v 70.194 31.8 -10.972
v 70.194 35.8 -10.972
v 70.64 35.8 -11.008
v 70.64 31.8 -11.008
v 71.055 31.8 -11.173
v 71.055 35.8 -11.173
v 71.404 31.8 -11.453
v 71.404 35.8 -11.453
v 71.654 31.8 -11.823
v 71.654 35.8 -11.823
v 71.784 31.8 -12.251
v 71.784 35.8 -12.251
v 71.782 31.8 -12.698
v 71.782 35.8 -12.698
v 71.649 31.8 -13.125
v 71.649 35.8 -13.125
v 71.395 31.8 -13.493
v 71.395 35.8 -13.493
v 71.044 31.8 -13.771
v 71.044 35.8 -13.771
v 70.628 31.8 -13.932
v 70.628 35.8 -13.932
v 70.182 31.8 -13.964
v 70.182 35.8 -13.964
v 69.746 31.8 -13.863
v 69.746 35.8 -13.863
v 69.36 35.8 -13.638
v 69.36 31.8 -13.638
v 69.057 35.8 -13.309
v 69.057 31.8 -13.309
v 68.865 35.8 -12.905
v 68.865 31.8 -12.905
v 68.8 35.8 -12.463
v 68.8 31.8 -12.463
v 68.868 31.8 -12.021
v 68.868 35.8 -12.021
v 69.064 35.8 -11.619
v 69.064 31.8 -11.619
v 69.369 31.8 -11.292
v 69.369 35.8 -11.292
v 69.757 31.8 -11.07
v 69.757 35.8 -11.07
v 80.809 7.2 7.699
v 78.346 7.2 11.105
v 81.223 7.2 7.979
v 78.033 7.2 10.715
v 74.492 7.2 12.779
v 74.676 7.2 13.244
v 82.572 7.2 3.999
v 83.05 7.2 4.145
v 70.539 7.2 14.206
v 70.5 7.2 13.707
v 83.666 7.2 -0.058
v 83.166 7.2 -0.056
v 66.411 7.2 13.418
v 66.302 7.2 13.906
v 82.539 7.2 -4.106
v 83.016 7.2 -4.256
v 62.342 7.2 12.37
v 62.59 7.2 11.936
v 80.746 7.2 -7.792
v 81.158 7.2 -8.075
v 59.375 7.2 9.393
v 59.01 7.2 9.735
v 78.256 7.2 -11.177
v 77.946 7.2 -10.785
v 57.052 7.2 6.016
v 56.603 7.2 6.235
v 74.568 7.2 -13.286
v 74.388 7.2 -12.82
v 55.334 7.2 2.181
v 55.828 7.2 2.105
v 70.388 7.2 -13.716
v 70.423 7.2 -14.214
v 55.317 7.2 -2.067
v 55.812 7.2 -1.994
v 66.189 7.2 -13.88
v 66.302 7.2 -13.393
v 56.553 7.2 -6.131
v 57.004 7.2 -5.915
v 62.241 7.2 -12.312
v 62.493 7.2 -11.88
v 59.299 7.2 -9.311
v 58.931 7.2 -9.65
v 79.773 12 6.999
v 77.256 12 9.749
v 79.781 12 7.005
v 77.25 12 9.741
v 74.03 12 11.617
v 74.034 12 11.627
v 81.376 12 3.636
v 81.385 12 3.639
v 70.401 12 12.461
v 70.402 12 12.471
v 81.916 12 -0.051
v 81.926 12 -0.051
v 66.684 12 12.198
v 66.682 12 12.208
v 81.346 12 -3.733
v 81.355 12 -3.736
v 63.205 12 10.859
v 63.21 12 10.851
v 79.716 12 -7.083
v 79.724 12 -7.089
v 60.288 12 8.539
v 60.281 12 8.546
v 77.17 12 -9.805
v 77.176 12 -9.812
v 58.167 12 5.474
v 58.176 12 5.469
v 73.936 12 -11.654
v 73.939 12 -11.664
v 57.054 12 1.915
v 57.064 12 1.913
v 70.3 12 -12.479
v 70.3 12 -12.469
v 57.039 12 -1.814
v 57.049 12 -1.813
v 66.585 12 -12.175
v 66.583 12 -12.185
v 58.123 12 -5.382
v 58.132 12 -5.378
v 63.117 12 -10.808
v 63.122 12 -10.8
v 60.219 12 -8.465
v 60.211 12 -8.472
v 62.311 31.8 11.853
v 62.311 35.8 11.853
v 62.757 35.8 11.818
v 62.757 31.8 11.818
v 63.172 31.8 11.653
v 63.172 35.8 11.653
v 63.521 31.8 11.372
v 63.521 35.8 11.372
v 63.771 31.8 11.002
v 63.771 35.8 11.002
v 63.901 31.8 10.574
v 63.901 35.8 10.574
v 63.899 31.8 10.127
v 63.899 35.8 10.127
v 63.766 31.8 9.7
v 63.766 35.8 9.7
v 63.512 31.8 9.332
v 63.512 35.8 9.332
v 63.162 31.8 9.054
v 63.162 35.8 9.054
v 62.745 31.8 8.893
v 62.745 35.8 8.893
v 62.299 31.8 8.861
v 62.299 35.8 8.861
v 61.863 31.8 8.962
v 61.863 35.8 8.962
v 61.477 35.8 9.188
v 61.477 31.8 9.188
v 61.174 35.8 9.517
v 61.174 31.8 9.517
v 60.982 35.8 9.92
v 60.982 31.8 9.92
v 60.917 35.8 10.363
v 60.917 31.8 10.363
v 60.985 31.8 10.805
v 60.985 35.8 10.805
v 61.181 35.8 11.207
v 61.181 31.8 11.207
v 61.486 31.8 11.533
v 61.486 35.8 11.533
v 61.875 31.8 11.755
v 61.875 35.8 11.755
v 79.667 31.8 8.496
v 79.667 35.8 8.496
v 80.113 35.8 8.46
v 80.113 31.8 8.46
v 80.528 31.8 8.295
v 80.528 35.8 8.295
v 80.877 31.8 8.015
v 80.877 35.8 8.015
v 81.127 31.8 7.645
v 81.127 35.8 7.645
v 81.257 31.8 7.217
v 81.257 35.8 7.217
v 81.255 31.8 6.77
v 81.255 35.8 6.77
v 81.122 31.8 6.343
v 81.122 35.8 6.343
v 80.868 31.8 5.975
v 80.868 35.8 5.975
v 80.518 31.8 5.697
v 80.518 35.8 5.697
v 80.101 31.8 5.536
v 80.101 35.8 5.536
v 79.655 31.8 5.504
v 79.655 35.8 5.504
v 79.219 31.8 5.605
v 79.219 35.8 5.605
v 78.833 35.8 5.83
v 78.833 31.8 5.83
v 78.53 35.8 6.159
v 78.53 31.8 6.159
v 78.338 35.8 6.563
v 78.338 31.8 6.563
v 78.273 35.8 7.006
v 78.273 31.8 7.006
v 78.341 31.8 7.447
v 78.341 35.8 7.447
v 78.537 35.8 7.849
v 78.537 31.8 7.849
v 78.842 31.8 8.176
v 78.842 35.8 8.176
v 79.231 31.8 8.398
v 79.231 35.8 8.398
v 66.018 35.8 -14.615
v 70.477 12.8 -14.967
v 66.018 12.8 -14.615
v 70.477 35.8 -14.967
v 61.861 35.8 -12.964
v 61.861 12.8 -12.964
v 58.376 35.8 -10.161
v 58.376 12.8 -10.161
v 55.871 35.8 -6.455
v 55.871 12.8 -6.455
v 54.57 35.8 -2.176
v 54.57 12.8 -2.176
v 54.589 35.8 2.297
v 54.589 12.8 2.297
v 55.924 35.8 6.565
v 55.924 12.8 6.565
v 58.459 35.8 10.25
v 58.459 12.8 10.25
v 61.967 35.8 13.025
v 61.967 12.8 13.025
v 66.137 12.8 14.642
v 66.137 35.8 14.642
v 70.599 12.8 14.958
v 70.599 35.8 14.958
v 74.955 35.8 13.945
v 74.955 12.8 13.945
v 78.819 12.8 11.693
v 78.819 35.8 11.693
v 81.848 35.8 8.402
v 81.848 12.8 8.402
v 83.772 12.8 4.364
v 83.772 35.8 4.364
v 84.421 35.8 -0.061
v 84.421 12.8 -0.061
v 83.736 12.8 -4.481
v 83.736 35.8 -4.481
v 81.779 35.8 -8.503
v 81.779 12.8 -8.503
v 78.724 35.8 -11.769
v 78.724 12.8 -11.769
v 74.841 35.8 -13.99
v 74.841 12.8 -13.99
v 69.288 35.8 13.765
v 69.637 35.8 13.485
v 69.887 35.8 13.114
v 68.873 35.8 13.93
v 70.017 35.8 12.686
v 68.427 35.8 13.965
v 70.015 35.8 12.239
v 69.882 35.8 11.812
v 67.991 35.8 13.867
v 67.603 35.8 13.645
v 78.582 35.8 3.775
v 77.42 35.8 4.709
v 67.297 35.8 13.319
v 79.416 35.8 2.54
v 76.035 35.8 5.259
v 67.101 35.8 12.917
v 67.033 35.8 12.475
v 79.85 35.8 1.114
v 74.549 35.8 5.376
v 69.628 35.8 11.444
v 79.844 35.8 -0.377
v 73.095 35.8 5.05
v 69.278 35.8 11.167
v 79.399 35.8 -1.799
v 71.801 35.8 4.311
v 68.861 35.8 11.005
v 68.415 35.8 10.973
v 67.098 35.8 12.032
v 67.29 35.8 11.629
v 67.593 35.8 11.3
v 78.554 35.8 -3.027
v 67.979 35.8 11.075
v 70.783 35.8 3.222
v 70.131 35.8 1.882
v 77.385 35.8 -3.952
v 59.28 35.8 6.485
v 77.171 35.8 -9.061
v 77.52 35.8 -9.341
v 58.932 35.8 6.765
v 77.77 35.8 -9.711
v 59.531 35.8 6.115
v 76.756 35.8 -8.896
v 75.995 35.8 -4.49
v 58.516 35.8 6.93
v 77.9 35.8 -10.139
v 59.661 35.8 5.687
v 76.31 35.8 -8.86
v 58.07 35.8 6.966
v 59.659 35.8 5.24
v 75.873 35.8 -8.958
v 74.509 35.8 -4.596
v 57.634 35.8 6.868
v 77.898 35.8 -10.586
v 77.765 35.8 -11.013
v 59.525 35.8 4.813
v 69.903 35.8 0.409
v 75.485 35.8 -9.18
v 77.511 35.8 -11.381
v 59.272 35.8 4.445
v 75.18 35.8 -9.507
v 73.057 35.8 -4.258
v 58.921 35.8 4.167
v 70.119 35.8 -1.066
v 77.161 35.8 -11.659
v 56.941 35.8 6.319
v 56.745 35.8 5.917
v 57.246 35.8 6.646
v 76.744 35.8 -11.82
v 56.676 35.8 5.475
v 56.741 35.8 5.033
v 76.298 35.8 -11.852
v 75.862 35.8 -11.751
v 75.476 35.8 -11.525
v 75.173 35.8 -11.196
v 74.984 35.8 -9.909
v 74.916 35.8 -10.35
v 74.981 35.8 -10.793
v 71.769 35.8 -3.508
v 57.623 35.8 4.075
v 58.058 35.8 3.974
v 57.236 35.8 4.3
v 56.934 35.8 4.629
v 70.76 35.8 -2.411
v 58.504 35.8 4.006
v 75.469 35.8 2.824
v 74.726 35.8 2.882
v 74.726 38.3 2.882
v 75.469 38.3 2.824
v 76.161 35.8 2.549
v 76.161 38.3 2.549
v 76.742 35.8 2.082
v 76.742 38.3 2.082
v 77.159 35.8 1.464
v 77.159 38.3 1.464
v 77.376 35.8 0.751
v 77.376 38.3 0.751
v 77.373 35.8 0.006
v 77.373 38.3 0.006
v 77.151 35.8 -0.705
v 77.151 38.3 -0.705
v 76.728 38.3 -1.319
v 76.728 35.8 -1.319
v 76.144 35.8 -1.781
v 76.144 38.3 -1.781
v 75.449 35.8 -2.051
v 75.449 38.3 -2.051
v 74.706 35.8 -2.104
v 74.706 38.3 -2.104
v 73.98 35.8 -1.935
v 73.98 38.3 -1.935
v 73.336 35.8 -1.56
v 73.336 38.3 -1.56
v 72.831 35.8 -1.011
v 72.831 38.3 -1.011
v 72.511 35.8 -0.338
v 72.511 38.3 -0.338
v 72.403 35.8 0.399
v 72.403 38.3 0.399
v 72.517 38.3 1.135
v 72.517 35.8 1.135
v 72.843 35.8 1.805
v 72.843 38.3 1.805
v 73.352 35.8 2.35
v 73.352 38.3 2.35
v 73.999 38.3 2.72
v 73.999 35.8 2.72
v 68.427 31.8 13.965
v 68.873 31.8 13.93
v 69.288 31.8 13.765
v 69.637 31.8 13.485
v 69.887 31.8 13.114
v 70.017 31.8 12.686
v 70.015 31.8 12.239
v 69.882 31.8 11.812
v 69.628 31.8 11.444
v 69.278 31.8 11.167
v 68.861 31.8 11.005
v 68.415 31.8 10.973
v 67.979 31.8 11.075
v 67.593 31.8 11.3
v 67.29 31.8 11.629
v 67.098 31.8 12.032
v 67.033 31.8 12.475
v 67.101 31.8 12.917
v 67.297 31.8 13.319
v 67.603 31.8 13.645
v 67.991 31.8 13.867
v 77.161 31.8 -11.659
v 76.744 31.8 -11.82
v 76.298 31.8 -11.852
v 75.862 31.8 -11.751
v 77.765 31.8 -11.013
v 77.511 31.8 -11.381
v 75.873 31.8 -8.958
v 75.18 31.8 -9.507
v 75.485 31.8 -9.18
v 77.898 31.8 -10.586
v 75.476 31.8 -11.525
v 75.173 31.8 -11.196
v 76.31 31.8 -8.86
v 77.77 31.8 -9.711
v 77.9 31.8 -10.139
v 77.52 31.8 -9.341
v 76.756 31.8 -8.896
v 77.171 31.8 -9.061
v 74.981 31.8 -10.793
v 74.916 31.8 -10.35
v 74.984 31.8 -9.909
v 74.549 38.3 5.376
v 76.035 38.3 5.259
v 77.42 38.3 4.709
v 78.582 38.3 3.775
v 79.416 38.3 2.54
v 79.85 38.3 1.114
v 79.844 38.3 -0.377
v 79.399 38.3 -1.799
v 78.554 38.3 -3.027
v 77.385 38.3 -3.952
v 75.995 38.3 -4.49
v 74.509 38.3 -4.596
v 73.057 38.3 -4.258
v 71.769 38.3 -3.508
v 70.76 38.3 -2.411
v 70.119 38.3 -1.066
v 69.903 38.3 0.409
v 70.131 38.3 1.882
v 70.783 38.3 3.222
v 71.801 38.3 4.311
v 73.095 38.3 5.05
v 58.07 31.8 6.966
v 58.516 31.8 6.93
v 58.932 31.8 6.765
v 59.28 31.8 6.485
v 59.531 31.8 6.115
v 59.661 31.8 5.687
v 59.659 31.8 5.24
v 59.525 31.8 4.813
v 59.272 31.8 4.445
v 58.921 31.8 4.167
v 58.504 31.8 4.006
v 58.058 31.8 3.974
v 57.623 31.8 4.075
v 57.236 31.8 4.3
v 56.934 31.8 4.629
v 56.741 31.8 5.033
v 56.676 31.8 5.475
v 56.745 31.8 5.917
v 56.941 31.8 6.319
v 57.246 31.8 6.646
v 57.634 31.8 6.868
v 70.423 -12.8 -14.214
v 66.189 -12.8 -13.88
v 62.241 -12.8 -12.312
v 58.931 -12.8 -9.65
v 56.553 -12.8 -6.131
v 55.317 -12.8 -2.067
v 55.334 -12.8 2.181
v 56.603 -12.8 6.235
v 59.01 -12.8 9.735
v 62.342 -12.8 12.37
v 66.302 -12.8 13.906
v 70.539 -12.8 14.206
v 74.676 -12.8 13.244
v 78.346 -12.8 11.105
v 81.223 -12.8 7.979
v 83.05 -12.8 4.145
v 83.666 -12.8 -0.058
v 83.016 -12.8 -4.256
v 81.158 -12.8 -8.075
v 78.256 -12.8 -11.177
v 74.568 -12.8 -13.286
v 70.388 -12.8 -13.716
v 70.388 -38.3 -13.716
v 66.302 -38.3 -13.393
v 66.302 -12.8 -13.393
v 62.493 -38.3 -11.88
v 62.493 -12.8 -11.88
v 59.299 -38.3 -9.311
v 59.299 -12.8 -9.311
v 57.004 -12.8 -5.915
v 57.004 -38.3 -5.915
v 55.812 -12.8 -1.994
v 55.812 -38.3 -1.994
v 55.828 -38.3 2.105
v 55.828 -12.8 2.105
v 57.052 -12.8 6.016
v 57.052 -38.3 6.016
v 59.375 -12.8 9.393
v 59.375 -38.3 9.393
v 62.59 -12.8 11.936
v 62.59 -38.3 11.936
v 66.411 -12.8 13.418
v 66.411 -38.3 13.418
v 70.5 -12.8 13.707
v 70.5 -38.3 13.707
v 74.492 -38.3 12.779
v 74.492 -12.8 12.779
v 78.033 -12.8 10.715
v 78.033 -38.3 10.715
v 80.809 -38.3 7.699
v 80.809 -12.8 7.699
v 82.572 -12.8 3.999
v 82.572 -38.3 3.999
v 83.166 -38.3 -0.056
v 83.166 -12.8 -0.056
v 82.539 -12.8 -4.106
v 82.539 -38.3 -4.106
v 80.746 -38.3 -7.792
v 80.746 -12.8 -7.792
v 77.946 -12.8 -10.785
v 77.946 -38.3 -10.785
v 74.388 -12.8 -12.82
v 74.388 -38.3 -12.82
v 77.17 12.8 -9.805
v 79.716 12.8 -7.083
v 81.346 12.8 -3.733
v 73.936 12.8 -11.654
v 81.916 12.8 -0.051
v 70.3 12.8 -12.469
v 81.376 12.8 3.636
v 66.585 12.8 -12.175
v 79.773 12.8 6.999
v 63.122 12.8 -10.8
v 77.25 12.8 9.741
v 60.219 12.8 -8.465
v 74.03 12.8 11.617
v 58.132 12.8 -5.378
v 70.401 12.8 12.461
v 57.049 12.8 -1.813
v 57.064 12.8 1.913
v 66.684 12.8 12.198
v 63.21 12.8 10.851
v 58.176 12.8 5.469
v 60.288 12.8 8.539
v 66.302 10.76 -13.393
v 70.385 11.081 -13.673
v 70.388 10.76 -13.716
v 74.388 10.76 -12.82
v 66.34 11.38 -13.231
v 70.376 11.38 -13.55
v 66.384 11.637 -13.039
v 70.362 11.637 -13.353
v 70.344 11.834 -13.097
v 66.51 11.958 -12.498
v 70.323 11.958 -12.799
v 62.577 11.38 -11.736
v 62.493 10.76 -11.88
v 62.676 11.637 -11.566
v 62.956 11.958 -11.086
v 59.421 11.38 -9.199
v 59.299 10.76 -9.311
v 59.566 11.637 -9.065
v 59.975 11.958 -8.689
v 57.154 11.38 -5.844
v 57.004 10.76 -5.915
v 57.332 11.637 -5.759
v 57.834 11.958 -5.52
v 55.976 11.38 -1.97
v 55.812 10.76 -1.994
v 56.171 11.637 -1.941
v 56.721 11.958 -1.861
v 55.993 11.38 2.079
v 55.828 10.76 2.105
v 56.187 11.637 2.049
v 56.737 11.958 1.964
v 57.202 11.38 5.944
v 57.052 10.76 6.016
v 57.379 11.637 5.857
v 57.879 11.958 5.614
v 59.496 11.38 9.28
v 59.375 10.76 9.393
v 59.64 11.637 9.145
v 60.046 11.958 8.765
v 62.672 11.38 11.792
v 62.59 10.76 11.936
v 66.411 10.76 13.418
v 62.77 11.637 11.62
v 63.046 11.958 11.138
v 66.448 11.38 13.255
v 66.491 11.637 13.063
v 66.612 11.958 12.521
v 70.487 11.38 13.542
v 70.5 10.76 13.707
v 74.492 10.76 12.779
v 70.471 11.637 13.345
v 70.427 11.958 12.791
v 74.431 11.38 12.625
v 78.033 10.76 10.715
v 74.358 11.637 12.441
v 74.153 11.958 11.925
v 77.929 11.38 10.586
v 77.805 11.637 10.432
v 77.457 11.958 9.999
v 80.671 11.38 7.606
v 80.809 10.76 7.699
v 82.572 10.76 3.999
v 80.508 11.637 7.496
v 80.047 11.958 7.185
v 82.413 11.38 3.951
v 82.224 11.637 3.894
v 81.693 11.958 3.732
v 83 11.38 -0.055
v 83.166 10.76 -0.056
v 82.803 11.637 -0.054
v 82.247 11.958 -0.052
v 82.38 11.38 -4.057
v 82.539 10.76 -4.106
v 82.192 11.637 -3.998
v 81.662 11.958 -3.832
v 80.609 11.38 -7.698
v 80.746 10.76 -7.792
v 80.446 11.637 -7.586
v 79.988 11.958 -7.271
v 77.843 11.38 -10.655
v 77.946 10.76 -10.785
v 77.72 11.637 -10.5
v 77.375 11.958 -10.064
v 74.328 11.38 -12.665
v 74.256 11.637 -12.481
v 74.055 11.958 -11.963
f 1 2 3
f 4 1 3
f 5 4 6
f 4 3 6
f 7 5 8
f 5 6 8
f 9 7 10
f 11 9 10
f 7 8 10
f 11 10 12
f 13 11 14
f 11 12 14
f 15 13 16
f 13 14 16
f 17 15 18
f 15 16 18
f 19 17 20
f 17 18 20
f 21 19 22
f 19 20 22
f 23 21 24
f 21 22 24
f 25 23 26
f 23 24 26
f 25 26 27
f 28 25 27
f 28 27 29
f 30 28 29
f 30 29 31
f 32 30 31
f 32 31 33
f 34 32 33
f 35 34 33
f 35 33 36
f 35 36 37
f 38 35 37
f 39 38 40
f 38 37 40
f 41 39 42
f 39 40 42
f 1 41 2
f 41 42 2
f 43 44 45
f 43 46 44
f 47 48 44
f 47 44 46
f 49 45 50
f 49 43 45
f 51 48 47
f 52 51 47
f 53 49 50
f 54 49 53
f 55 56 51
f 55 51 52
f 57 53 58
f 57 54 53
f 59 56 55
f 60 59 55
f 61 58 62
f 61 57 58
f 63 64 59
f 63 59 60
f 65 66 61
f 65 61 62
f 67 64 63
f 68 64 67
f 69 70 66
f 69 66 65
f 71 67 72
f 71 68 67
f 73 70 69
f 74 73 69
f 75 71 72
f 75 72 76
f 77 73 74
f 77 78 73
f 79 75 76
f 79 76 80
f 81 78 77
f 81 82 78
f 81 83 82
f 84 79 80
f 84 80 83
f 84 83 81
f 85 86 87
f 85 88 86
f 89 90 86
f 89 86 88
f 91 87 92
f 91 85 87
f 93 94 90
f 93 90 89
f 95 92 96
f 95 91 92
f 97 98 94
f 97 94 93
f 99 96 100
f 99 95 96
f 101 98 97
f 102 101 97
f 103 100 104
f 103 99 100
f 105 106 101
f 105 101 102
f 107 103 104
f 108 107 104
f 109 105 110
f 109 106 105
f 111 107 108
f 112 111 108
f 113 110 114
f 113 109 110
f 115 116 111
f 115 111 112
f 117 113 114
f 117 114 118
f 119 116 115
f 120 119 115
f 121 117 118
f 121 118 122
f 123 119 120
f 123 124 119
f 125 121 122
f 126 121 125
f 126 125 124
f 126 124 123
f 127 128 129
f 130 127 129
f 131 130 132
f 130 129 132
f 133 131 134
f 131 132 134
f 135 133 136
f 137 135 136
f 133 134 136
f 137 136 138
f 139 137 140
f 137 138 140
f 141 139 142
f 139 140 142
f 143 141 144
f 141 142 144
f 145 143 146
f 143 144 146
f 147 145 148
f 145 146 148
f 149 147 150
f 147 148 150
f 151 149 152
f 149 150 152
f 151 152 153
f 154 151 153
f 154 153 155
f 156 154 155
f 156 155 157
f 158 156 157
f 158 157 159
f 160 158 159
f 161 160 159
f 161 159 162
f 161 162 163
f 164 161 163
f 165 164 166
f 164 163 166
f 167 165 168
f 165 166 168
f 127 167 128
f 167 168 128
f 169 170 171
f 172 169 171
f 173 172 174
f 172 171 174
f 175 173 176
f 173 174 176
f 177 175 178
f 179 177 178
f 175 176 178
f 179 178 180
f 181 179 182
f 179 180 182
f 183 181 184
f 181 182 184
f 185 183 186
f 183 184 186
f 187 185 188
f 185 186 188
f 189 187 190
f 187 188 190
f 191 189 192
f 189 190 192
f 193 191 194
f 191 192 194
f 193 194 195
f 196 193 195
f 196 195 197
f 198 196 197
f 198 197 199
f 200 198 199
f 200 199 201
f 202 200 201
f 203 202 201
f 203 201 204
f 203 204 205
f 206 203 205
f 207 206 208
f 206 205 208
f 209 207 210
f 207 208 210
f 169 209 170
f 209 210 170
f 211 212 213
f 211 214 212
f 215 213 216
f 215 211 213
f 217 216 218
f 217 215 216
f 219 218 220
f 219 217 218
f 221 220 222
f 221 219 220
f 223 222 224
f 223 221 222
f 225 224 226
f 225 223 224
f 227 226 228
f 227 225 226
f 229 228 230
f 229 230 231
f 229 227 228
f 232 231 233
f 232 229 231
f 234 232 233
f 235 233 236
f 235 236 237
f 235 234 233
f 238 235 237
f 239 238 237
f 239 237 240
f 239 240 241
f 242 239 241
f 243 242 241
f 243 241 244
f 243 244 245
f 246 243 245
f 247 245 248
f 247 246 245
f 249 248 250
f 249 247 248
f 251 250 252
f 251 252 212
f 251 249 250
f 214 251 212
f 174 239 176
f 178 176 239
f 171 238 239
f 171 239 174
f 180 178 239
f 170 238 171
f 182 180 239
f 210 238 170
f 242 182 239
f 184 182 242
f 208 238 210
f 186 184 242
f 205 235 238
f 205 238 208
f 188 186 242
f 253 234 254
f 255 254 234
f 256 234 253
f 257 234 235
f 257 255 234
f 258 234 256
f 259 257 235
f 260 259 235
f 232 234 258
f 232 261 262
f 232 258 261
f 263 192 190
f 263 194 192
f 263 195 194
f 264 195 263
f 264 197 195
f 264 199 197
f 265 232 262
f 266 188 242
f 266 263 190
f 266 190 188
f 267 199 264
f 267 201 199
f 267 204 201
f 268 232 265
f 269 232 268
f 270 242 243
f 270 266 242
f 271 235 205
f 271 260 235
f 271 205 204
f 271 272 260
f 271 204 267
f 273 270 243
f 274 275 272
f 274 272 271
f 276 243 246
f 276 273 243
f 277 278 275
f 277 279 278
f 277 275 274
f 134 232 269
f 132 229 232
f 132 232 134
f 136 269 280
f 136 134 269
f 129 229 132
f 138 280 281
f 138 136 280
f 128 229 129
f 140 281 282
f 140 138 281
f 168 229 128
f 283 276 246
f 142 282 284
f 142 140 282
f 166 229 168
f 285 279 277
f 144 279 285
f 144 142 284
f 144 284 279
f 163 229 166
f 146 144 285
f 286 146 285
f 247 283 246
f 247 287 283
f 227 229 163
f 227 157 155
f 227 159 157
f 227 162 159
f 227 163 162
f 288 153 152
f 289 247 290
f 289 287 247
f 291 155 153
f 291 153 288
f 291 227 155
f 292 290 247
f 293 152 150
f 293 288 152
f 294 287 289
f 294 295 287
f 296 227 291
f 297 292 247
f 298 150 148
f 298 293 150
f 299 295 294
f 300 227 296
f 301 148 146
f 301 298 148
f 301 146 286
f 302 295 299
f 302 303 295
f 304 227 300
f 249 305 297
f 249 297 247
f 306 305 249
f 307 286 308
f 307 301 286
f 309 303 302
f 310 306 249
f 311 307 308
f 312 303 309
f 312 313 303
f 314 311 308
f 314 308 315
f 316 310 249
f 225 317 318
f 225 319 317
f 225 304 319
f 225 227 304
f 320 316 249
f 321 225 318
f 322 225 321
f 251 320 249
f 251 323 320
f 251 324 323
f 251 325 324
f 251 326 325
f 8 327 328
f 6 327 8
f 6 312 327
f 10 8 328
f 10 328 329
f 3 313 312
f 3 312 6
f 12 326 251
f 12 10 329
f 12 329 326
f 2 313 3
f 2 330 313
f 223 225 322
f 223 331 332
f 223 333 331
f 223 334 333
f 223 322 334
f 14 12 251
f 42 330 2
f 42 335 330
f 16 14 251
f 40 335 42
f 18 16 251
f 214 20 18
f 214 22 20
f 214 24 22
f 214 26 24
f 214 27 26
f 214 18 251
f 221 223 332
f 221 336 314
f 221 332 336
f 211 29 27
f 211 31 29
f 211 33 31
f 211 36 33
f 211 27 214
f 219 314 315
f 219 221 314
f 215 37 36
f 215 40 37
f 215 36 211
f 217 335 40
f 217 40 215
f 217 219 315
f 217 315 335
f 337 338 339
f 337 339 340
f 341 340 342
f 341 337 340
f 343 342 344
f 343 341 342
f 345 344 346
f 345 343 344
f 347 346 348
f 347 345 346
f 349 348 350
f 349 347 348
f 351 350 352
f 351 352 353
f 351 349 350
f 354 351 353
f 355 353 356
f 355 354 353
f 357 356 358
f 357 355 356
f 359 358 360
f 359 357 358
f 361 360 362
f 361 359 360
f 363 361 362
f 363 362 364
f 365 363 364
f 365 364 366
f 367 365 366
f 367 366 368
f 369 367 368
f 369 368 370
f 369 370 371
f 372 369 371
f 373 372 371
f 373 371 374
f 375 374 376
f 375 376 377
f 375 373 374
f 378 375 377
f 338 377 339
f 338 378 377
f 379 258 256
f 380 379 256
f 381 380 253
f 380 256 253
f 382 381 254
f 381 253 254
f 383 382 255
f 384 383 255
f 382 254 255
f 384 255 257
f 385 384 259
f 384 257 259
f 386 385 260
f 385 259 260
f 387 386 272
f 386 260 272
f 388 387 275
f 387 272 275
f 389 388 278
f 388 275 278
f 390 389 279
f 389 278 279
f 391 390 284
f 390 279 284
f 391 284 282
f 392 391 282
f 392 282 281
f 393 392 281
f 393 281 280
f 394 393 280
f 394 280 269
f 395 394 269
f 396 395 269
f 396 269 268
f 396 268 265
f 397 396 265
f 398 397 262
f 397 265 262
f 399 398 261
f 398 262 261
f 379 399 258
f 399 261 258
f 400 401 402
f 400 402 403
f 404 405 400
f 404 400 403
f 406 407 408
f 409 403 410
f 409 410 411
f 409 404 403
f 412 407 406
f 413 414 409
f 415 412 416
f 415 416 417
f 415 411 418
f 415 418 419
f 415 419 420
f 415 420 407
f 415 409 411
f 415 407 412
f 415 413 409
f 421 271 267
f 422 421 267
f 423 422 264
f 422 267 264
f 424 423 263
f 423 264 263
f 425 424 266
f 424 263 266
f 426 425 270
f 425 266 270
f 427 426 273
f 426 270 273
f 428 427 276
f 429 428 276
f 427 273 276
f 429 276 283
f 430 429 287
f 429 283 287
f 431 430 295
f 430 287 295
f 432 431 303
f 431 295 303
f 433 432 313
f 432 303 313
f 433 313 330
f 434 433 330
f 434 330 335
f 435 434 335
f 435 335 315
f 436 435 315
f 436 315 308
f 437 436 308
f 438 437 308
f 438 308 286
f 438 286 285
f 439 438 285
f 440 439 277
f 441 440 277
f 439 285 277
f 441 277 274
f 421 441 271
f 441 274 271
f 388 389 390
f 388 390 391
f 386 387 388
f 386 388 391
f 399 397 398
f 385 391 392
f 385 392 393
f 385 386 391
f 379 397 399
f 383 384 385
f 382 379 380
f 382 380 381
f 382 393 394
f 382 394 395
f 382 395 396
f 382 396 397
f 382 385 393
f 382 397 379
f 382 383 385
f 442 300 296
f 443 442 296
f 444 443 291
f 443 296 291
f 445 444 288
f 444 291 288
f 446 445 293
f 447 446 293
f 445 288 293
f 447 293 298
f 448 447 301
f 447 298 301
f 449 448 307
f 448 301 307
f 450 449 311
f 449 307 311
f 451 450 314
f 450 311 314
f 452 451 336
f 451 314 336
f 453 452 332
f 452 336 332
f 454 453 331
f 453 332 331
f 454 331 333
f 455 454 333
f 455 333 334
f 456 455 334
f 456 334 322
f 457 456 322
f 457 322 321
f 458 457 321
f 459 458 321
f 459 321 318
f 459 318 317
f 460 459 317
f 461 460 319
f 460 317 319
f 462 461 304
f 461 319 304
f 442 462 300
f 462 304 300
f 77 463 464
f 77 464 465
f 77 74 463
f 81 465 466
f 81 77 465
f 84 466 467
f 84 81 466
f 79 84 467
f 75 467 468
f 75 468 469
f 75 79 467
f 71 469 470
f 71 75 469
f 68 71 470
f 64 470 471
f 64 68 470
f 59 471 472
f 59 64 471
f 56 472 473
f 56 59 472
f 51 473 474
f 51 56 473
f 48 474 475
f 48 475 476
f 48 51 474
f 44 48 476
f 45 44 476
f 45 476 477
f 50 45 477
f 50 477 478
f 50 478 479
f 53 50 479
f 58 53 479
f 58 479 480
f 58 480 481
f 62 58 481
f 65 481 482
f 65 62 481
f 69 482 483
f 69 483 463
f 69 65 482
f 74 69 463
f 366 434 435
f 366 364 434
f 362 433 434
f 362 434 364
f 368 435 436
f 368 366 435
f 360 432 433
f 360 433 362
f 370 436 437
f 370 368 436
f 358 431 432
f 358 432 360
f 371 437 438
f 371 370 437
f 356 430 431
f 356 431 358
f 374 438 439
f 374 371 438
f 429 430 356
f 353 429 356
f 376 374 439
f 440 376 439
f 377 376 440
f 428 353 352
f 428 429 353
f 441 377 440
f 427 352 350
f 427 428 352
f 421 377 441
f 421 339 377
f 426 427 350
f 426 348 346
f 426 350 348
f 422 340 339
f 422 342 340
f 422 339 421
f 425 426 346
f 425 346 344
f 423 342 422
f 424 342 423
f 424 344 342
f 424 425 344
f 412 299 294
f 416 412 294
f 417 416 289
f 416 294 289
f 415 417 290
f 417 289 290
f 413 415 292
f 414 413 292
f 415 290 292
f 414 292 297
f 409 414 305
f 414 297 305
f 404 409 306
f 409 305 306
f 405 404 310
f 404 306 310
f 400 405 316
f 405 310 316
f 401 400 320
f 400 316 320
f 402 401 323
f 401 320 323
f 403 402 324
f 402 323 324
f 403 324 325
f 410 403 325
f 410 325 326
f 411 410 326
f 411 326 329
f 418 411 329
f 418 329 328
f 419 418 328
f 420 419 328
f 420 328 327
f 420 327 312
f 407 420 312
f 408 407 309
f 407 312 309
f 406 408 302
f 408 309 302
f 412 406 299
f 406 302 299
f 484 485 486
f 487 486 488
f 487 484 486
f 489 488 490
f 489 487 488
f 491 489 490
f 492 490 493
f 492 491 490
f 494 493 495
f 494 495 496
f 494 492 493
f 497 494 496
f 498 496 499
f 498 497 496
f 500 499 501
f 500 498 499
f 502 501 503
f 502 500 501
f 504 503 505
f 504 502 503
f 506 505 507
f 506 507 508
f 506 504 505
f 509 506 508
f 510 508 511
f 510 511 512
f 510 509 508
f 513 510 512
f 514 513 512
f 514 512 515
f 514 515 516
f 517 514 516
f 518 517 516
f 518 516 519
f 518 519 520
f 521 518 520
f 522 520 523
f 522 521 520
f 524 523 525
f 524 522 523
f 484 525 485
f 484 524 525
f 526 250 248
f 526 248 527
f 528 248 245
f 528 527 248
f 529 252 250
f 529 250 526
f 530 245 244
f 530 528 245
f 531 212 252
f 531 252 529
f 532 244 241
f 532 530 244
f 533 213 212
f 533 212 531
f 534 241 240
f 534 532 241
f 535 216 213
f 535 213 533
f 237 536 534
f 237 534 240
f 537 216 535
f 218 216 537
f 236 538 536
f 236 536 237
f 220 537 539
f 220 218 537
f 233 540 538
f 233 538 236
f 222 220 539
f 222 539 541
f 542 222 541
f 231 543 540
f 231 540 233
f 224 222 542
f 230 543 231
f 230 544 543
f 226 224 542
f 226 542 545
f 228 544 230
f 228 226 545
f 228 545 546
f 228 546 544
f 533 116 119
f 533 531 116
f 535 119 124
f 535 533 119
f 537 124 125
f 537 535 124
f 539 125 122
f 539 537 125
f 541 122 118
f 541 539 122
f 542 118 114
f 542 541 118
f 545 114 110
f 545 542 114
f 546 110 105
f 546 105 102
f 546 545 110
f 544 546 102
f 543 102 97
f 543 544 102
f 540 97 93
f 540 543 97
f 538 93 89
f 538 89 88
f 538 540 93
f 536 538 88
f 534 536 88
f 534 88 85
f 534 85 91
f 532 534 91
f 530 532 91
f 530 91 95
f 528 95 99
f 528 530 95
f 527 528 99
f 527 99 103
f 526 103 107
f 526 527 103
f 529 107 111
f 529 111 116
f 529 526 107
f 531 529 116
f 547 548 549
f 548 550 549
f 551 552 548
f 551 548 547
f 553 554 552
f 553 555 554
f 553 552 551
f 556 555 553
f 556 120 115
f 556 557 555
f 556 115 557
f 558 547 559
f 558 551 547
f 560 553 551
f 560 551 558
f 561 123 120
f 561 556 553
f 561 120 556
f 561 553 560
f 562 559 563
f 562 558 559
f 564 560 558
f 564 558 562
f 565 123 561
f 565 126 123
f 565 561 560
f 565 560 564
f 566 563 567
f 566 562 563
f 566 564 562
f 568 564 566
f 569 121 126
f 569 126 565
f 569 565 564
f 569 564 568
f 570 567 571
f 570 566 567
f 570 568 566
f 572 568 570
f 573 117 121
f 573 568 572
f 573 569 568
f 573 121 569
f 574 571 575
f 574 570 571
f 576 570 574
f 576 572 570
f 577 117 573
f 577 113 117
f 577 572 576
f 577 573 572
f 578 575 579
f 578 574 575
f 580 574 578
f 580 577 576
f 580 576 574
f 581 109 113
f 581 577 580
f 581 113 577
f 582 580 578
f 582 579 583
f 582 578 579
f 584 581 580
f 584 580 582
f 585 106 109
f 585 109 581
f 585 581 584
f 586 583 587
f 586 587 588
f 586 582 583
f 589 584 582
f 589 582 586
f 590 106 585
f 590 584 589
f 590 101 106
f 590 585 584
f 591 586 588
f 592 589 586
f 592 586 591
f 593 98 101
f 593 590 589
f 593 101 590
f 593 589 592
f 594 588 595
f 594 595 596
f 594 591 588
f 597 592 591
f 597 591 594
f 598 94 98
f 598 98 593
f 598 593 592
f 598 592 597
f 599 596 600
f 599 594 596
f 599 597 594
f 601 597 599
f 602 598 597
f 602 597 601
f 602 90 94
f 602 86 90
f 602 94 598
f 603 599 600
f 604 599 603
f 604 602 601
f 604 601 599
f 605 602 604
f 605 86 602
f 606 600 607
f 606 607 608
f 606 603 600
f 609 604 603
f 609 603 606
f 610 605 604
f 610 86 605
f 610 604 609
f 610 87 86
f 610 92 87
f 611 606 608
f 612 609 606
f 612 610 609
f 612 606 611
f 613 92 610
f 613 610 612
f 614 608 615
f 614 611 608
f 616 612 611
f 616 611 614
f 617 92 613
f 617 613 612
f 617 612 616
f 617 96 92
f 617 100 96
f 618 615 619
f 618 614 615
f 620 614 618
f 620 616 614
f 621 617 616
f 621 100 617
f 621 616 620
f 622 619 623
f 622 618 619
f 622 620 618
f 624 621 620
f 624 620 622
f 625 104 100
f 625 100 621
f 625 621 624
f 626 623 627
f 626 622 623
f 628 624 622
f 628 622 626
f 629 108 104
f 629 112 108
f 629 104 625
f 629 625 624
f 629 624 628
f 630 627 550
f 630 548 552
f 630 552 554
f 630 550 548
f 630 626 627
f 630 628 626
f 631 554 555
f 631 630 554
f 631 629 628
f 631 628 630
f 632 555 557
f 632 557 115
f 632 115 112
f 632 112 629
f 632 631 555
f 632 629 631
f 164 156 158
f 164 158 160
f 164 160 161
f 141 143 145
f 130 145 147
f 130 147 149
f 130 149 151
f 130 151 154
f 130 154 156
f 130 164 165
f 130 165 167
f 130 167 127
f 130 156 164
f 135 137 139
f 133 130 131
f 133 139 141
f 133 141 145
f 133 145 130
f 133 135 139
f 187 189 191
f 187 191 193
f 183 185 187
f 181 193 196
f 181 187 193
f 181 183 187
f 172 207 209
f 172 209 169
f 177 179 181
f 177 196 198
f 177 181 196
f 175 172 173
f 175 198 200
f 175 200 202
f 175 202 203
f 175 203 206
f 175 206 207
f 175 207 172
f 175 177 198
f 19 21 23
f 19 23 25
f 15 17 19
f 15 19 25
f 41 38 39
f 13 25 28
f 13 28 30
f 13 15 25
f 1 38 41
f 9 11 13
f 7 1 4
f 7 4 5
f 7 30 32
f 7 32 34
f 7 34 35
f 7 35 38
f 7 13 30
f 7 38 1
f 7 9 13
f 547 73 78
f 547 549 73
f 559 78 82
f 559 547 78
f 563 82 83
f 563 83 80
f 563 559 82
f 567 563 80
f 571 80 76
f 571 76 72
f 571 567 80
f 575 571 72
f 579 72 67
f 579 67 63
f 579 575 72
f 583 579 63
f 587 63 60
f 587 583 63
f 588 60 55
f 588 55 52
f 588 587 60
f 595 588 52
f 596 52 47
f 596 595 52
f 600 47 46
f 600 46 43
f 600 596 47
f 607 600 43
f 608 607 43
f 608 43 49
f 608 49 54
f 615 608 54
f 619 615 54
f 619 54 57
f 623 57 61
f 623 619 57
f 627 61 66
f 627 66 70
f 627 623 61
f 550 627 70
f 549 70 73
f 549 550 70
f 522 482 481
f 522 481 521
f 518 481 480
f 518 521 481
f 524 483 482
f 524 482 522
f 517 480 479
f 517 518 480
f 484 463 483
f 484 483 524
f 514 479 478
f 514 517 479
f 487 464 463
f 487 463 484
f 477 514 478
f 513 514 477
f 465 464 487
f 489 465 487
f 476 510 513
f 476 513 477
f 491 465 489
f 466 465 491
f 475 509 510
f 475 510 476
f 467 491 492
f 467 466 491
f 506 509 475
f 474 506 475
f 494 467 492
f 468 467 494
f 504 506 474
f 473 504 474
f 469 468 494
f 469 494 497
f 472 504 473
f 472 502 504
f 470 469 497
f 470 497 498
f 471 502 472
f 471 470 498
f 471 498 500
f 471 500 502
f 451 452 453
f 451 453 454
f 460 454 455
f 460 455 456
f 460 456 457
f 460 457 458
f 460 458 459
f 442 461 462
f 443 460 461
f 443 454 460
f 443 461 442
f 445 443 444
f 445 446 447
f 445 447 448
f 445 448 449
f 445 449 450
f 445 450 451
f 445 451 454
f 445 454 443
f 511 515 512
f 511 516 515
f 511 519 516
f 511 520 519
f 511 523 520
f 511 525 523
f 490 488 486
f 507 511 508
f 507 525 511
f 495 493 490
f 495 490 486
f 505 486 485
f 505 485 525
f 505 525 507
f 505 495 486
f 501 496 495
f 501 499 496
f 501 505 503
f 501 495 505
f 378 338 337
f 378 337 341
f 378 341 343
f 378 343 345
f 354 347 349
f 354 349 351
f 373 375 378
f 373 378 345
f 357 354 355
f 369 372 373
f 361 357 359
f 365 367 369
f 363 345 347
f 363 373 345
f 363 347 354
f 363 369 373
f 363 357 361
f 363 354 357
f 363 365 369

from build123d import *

# Parameters (mm, degrees)
SKETCH5_R             = 1.5
CUT_EXTRUDE1_DEPTH    = 4
SKETCH3_R             = 5
SKETCH3_R_2           = 2.5
BOSS_EXTRUDE3_DEPTH   = 2.5
BODY_MOVE_COPY1_ANGLE = 180
BODY_MOVE_COPY2_ANGLE = 180
BODY_MOVE_COPY3_ANGLE = 90


with BuildPart() as part:
    # Sketch1 → Revolve1 (revolve)
    with BuildSketch(Plane.XY, mode=Mode.PRIVATE) as revolve1_sk:
        with BuildLine():
            Line((33.701320748, 0), (33.701320748, 13.75))
            Line((33.701320748, 13.75), (21.201320748, 13.75))
            Line((21.201320748, 13.75), (8.201320748, 13.75))
            Line((8.201320748, 13.75), (8.201320748, 14.25))
            Line((8.201320748, 14.25), (-11.798679252, 14.25))
            Line((-11.798679252, 14.25), (-11.798679252, 13.75))
            Line((-11.798679252, 13.75), (-15.358679252, 13.75))
            ThreePointArc((-15.358679252, 13.75), (-16.23549166, 13.386812409), (-16.598679252, 12.51))
            Line((-16.598679252, 12.51), (-16.598679252, 12.5))
            Line((-16.598679252, 12.5), (-17.398679252, 12.5))
            Line((-17.398679252, 12.5), (-17.398679252, 15.00458738))
            Line((-17.398679252, 15.00458738), (-40.398679252, 15.00458738))
            Line((-40.398679252, 15.00458738), (-40.398679252, 0))
            Line((-40.398679252, 0), (33.701320748, 0))
        make_face()
    revolve(revolve1_sk.sketch.rotate(Axis((59.495632986, 0, 0), (-1, 0, 0)), 90), axis=Axis((59.495632986, 0, 0), (-1, 0, 0)))

    # Sketch5 → Cut-Extrude1 (cut)
    with BuildSketch(Plane.ZY.offset(40.398679252)):
        with Locations((-12.5, 0)):
            Circle(SKETCH5_R)
        with Locations((-10.825317547, 6.25)):
            Circle(SKETCH5_R)
        with Locations((6.25, 10.825317547)):
            Circle(SKETCH5_R)
        with Locations((12.5, 0)):
            Circle(SKETCH5_R)
        with Locations((10.825317547, -6.25)):
            Circle(SKETCH5_R)
        with Locations((6.25, -10.825317547)):
            Circle(SKETCH5_R)
    extrude(amount=-CUT_EXTRUDE1_DEPTH, mode=Mode.SUBTRACT)

    # Sketch3 → Boss-Extrude3 (add)
    with BuildSketch(Plane.ZY.offset(40.398679252)):
        with Locations((0, 5.5)):
            Circle(SKETCH3_R)
        with Locations((0, 5.5)):
            Circle(SKETCH3_R_2, mode=Mode.SUBTRACT)
    extrude(amount=BOSS_EXTRUDE3_DEPTH)


with BuildPart() as part_1:
    # Body-Move/Copy1: moved
    add(part.part.moved(Location((0, 0, 0))).rotate(Axis((-4.598679252, 0, 0), (0, 0, 1)), BODY_MOVE_COPY1_ANGLE))


with BuildPart() as part_2:
    # Body-Move/Copy2: moved
    add(part_1.part.moved(Location((0, 0, 0))).rotate(Axis((-4.598679252, 0, 0), (1.0345263845412585e-14, -0.03535860277253268, 0.9993746890981252)), BODY_MOVE_COPY2_ANGLE))


with BuildPart() as part_3:
    # Body-Move/Copy3: moved
    add(part_2.part.rotate(Axis((-4.598679252, 0, 0), (0, 0, -1)), BODY_MOVE_COPY3_ANGLE))


with BuildPart() as part_4:
    # Body-Move/Copy4: moved
    add(part_3.part.moved(Location((74.015049938, 0, 0))))


solid = part_4.part
